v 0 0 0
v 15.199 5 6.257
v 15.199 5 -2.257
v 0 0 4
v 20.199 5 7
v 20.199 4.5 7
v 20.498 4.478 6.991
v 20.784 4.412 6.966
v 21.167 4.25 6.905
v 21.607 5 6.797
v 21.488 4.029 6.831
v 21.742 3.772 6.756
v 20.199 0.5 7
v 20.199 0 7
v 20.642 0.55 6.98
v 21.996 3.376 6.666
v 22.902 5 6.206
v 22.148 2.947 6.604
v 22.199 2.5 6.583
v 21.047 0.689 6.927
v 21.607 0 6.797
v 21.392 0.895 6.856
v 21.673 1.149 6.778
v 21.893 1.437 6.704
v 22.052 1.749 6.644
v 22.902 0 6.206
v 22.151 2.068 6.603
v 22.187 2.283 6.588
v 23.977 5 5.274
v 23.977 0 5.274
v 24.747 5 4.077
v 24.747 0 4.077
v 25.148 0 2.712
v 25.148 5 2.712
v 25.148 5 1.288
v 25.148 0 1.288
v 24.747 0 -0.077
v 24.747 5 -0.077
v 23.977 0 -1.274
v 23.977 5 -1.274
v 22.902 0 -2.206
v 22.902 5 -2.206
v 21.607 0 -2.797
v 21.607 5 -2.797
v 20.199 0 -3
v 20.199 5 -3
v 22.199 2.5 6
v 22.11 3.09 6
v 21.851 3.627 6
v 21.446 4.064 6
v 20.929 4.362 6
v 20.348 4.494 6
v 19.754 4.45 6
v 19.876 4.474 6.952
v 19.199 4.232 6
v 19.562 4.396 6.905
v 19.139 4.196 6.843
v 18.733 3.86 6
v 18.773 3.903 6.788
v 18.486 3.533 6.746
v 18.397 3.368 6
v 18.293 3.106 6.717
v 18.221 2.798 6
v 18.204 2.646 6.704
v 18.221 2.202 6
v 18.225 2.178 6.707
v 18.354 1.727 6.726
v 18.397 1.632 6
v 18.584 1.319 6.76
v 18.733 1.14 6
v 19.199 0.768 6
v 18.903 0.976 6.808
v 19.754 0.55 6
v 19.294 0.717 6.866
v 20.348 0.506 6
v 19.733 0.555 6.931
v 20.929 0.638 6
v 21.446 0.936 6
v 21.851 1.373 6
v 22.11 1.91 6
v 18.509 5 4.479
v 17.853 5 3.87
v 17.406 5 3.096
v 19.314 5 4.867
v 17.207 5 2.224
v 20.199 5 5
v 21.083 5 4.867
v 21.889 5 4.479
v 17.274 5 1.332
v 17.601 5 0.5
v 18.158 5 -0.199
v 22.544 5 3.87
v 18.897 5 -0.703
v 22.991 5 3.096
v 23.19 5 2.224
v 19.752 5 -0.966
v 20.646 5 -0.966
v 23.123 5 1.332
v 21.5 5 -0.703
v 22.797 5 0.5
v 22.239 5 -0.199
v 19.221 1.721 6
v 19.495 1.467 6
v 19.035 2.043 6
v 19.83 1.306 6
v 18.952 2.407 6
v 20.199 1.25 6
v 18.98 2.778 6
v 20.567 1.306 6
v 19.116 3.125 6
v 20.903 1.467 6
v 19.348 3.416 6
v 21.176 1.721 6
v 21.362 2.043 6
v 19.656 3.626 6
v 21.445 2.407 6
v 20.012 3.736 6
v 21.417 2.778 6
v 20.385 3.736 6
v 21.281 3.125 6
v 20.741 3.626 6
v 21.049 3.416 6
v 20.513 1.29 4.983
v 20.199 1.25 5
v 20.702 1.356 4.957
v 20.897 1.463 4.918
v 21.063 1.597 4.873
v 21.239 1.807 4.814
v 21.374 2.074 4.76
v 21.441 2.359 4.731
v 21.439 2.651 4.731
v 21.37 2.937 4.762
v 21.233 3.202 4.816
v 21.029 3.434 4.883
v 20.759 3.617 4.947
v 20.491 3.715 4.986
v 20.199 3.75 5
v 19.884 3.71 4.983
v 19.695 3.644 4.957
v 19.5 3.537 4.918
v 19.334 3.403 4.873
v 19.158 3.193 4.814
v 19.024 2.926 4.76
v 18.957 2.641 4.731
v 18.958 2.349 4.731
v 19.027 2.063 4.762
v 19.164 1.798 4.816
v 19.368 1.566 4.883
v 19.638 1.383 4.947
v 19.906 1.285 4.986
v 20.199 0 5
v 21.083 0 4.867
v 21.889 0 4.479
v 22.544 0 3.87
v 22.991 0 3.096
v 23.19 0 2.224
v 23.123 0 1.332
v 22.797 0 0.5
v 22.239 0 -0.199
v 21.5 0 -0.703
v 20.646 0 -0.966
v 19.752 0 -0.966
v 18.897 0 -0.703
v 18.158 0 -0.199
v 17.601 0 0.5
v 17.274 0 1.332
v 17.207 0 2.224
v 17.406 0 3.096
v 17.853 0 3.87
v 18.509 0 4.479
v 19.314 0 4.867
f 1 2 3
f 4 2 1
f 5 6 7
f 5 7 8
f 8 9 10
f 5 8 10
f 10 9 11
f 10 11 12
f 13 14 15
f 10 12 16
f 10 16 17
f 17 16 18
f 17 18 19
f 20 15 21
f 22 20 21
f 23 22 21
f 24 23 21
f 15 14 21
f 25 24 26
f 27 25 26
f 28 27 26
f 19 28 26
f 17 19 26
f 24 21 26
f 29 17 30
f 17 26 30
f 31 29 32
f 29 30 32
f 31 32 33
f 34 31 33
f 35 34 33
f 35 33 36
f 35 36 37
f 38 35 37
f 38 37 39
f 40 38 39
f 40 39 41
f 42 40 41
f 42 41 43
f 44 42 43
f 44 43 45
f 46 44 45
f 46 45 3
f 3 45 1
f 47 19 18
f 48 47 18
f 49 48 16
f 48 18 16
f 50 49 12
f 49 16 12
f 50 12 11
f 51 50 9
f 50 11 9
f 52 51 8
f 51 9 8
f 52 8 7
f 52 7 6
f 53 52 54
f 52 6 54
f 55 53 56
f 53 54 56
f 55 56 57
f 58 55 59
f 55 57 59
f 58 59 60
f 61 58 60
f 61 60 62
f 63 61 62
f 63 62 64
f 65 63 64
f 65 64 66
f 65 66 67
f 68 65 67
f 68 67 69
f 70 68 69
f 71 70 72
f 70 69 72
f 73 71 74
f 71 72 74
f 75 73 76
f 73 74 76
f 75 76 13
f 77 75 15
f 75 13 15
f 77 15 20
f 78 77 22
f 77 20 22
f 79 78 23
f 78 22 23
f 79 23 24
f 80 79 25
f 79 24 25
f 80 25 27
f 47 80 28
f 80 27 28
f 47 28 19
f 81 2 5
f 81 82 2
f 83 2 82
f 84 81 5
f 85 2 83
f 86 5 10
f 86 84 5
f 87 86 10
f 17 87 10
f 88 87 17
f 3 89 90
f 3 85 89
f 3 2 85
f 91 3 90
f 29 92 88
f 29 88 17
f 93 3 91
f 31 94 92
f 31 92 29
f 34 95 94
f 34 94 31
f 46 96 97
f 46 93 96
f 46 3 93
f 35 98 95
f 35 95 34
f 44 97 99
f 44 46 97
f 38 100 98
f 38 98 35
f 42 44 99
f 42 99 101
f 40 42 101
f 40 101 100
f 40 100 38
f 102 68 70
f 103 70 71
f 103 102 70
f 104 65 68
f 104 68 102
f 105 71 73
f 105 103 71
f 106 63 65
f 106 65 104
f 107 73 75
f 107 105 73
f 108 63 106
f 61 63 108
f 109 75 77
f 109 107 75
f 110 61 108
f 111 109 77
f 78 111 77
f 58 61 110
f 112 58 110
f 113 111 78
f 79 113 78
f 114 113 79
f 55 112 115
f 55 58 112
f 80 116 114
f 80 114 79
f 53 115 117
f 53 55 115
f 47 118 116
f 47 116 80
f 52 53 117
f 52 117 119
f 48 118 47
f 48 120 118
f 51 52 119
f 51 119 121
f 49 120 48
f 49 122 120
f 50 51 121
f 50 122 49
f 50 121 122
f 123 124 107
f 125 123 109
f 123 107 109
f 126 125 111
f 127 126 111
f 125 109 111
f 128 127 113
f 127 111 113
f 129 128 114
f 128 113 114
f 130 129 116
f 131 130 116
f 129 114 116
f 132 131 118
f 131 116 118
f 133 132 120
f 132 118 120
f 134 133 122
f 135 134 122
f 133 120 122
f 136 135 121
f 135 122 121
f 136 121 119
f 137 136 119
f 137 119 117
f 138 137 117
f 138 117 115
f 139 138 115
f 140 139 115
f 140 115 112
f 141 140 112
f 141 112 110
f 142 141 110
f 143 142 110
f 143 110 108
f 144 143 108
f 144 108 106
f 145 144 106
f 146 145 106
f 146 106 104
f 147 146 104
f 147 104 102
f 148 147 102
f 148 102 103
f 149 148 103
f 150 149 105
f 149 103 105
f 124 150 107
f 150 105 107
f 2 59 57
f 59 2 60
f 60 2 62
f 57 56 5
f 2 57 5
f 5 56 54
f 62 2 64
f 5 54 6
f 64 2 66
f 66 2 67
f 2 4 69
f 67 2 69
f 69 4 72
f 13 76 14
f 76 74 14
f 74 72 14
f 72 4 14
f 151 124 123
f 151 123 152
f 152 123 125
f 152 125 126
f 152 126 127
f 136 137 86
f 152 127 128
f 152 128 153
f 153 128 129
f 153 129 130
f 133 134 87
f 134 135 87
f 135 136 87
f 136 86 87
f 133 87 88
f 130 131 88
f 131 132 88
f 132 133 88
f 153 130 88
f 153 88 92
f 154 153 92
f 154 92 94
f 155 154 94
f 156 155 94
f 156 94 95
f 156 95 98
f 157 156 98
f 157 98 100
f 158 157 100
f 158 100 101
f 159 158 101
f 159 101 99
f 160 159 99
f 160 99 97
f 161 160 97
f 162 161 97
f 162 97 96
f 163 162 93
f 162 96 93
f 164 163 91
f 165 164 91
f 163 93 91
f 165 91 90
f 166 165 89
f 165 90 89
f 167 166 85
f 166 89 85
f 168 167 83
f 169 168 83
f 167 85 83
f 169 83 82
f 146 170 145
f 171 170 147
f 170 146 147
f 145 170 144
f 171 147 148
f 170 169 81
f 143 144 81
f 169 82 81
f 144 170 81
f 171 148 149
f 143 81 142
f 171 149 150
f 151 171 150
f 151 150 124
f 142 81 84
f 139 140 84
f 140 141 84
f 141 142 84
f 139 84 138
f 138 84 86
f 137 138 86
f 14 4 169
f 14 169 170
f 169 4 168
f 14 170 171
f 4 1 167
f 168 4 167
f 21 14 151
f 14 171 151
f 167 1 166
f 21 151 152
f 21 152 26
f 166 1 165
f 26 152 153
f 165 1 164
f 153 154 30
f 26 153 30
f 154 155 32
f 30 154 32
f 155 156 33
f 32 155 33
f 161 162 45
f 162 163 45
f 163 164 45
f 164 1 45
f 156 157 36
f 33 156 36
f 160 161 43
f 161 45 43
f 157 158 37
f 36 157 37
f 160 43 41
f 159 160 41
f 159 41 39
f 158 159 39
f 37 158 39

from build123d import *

# Parameters (mm, degrees)
BOSS_EXTRUDE4_DEPTH     = 4
BOSS_EXTRUDE6_DEPTH     = 5
CUT_EXTRUDE3_REACH      = 28.627
CUT_EXTRUDE2_REACH      = 28.627
SKETCH9_R               = 3
CUT_EXTRUDE4_REACH      = 29.568
CUT_EXTRUDE4_END_RADIUS = 3
SKETCH12_R              = 1.25
SKETCH13_R              = 2
CUT_EXTRUDE5_DEPTH      = 1


with BuildPart() as part:
    # Sketch1 → Boss-Extrude4 (new body)
    with BuildSketch(Plane.XY):
        Polygon((0, 0), (15.198684154, 5), (15.198684154, 0), align=None)
    extrude(amount=BOSS_EXTRUDE4_DEPTH)

    # Sketch7 → Boss-Extrude6 (add)
    with BuildSketch(Plane(origin=(0, 0, 0), x_dir=(1, 0, 0), z_dir=(0, 1, 0))):
        with BuildLine():
            Line((20.198684154, 3), (0, 0))
            Line((0, 0), (15.198684154, 0))
            Line((15.198684154, 0), (15.198684154, -4))
            Line((15.198684154, -4), (0, -4))
            Line((0, -4), (20.198684154, -7))
            ThreePointArc((20.198684154, -7), (25.198684154, -2), (20.198684154, 3))
        make_face()
    extrude(amount=BOSS_EXTRUDE6_DEPTH)

    # Sketch10 → Cut-Extrude3 (cut, up to next)
    with BuildSketch(Plane.XY, mode=Mode.PRIVATE) as cut_extrude3_sk1:
        Polygon((0, 0), (0, 5), (15.198684154, 5), align=None)
    cut_extrude3_tool1 = extrude(cut_extrude3_sk1.sketch, amount=-CUT_EXTRUDE3_REACH, mode=Mode.PRIVATE) & part.part
    cut_extrude3 = cut_extrude3_tool1.solids().sort_by_distance((5.066228, 3.333333, 0))[0]
    add(cut_extrude3, mode=Mode.SUBTRACT)

    # Sketch9 → Cut-Extrude2 (cut, up to next)
    with BuildSketch(Plane(origin=(0, 5, 0), x_dir=(1, 0, 0), z_dir=(0, 1, 0)), mode=Mode.PRIVATE) as cut_extrude2_sk1:
        with Locations(Location((20.198684154, -2, 0), (0, 0, 270))):
            Circle(SKETCH9_R)
    cut_extrude2_tool1 = extrude(cut_extrude2_sk1.sketch, amount=-CUT_EXTRUDE2_REACH, mode=Mode.PRIVATE) & part.part
    add(cut_extrude2_tool1.solids().sort_by_distance((20.198684, 5, 2))[0], mode=Mode.SUBTRACT)

    # Mirror1: Cut-Extrude3 across plane
    add(cut_extrude3.mirror(Plane.XY.offset(2)), mode=Mode.SUBTRACT)

    # Cut-Extrude4: up to this cylinder (the profile starts outside it)
    cut_extrude4_end = Plane(origin=(20.198684154, 2.5, 2), z_dir=(0, 1, 0)) * Cylinder(CUT_EXTRUDE4_END_RADIUS, 66.136, mode=Mode.PRIVATE)
    # Sketch12 → Cut-Extrude4 (cut, up to the surface)
    with BuildSketch(Plane.XY.offset(7), mode=Mode.PRIVATE) as cut_extrude4_sk1:
        with Locations(Location((20.198684154, 2.5, 0), (0, 0, 270))):
            Circle(SKETCH12_R)
    cut_extrude4_tool1 = extrude(cut_extrude4_sk1.sketch, amount=-CUT_EXTRUDE4_REACH, mode=Mode.PRIVATE) - cut_extrude4_end
    add(cut_extrude4_tool1.solids().sort_by_distance((20.198684, 2.5, 7))[0], mode=Mode.SUBTRACT)

    # Sketch13 → Cut-Extrude5 (cut)
    with BuildSketch(Plane.XY.offset(7)):
        with Locations((20.198684154, 2.5)):
            Circle(SKETCH13_R)
    extrude(amount=-CUT_EXTRUDE5_DEPTH, mode=Mode.SUBTRACT)


solid = part.part
